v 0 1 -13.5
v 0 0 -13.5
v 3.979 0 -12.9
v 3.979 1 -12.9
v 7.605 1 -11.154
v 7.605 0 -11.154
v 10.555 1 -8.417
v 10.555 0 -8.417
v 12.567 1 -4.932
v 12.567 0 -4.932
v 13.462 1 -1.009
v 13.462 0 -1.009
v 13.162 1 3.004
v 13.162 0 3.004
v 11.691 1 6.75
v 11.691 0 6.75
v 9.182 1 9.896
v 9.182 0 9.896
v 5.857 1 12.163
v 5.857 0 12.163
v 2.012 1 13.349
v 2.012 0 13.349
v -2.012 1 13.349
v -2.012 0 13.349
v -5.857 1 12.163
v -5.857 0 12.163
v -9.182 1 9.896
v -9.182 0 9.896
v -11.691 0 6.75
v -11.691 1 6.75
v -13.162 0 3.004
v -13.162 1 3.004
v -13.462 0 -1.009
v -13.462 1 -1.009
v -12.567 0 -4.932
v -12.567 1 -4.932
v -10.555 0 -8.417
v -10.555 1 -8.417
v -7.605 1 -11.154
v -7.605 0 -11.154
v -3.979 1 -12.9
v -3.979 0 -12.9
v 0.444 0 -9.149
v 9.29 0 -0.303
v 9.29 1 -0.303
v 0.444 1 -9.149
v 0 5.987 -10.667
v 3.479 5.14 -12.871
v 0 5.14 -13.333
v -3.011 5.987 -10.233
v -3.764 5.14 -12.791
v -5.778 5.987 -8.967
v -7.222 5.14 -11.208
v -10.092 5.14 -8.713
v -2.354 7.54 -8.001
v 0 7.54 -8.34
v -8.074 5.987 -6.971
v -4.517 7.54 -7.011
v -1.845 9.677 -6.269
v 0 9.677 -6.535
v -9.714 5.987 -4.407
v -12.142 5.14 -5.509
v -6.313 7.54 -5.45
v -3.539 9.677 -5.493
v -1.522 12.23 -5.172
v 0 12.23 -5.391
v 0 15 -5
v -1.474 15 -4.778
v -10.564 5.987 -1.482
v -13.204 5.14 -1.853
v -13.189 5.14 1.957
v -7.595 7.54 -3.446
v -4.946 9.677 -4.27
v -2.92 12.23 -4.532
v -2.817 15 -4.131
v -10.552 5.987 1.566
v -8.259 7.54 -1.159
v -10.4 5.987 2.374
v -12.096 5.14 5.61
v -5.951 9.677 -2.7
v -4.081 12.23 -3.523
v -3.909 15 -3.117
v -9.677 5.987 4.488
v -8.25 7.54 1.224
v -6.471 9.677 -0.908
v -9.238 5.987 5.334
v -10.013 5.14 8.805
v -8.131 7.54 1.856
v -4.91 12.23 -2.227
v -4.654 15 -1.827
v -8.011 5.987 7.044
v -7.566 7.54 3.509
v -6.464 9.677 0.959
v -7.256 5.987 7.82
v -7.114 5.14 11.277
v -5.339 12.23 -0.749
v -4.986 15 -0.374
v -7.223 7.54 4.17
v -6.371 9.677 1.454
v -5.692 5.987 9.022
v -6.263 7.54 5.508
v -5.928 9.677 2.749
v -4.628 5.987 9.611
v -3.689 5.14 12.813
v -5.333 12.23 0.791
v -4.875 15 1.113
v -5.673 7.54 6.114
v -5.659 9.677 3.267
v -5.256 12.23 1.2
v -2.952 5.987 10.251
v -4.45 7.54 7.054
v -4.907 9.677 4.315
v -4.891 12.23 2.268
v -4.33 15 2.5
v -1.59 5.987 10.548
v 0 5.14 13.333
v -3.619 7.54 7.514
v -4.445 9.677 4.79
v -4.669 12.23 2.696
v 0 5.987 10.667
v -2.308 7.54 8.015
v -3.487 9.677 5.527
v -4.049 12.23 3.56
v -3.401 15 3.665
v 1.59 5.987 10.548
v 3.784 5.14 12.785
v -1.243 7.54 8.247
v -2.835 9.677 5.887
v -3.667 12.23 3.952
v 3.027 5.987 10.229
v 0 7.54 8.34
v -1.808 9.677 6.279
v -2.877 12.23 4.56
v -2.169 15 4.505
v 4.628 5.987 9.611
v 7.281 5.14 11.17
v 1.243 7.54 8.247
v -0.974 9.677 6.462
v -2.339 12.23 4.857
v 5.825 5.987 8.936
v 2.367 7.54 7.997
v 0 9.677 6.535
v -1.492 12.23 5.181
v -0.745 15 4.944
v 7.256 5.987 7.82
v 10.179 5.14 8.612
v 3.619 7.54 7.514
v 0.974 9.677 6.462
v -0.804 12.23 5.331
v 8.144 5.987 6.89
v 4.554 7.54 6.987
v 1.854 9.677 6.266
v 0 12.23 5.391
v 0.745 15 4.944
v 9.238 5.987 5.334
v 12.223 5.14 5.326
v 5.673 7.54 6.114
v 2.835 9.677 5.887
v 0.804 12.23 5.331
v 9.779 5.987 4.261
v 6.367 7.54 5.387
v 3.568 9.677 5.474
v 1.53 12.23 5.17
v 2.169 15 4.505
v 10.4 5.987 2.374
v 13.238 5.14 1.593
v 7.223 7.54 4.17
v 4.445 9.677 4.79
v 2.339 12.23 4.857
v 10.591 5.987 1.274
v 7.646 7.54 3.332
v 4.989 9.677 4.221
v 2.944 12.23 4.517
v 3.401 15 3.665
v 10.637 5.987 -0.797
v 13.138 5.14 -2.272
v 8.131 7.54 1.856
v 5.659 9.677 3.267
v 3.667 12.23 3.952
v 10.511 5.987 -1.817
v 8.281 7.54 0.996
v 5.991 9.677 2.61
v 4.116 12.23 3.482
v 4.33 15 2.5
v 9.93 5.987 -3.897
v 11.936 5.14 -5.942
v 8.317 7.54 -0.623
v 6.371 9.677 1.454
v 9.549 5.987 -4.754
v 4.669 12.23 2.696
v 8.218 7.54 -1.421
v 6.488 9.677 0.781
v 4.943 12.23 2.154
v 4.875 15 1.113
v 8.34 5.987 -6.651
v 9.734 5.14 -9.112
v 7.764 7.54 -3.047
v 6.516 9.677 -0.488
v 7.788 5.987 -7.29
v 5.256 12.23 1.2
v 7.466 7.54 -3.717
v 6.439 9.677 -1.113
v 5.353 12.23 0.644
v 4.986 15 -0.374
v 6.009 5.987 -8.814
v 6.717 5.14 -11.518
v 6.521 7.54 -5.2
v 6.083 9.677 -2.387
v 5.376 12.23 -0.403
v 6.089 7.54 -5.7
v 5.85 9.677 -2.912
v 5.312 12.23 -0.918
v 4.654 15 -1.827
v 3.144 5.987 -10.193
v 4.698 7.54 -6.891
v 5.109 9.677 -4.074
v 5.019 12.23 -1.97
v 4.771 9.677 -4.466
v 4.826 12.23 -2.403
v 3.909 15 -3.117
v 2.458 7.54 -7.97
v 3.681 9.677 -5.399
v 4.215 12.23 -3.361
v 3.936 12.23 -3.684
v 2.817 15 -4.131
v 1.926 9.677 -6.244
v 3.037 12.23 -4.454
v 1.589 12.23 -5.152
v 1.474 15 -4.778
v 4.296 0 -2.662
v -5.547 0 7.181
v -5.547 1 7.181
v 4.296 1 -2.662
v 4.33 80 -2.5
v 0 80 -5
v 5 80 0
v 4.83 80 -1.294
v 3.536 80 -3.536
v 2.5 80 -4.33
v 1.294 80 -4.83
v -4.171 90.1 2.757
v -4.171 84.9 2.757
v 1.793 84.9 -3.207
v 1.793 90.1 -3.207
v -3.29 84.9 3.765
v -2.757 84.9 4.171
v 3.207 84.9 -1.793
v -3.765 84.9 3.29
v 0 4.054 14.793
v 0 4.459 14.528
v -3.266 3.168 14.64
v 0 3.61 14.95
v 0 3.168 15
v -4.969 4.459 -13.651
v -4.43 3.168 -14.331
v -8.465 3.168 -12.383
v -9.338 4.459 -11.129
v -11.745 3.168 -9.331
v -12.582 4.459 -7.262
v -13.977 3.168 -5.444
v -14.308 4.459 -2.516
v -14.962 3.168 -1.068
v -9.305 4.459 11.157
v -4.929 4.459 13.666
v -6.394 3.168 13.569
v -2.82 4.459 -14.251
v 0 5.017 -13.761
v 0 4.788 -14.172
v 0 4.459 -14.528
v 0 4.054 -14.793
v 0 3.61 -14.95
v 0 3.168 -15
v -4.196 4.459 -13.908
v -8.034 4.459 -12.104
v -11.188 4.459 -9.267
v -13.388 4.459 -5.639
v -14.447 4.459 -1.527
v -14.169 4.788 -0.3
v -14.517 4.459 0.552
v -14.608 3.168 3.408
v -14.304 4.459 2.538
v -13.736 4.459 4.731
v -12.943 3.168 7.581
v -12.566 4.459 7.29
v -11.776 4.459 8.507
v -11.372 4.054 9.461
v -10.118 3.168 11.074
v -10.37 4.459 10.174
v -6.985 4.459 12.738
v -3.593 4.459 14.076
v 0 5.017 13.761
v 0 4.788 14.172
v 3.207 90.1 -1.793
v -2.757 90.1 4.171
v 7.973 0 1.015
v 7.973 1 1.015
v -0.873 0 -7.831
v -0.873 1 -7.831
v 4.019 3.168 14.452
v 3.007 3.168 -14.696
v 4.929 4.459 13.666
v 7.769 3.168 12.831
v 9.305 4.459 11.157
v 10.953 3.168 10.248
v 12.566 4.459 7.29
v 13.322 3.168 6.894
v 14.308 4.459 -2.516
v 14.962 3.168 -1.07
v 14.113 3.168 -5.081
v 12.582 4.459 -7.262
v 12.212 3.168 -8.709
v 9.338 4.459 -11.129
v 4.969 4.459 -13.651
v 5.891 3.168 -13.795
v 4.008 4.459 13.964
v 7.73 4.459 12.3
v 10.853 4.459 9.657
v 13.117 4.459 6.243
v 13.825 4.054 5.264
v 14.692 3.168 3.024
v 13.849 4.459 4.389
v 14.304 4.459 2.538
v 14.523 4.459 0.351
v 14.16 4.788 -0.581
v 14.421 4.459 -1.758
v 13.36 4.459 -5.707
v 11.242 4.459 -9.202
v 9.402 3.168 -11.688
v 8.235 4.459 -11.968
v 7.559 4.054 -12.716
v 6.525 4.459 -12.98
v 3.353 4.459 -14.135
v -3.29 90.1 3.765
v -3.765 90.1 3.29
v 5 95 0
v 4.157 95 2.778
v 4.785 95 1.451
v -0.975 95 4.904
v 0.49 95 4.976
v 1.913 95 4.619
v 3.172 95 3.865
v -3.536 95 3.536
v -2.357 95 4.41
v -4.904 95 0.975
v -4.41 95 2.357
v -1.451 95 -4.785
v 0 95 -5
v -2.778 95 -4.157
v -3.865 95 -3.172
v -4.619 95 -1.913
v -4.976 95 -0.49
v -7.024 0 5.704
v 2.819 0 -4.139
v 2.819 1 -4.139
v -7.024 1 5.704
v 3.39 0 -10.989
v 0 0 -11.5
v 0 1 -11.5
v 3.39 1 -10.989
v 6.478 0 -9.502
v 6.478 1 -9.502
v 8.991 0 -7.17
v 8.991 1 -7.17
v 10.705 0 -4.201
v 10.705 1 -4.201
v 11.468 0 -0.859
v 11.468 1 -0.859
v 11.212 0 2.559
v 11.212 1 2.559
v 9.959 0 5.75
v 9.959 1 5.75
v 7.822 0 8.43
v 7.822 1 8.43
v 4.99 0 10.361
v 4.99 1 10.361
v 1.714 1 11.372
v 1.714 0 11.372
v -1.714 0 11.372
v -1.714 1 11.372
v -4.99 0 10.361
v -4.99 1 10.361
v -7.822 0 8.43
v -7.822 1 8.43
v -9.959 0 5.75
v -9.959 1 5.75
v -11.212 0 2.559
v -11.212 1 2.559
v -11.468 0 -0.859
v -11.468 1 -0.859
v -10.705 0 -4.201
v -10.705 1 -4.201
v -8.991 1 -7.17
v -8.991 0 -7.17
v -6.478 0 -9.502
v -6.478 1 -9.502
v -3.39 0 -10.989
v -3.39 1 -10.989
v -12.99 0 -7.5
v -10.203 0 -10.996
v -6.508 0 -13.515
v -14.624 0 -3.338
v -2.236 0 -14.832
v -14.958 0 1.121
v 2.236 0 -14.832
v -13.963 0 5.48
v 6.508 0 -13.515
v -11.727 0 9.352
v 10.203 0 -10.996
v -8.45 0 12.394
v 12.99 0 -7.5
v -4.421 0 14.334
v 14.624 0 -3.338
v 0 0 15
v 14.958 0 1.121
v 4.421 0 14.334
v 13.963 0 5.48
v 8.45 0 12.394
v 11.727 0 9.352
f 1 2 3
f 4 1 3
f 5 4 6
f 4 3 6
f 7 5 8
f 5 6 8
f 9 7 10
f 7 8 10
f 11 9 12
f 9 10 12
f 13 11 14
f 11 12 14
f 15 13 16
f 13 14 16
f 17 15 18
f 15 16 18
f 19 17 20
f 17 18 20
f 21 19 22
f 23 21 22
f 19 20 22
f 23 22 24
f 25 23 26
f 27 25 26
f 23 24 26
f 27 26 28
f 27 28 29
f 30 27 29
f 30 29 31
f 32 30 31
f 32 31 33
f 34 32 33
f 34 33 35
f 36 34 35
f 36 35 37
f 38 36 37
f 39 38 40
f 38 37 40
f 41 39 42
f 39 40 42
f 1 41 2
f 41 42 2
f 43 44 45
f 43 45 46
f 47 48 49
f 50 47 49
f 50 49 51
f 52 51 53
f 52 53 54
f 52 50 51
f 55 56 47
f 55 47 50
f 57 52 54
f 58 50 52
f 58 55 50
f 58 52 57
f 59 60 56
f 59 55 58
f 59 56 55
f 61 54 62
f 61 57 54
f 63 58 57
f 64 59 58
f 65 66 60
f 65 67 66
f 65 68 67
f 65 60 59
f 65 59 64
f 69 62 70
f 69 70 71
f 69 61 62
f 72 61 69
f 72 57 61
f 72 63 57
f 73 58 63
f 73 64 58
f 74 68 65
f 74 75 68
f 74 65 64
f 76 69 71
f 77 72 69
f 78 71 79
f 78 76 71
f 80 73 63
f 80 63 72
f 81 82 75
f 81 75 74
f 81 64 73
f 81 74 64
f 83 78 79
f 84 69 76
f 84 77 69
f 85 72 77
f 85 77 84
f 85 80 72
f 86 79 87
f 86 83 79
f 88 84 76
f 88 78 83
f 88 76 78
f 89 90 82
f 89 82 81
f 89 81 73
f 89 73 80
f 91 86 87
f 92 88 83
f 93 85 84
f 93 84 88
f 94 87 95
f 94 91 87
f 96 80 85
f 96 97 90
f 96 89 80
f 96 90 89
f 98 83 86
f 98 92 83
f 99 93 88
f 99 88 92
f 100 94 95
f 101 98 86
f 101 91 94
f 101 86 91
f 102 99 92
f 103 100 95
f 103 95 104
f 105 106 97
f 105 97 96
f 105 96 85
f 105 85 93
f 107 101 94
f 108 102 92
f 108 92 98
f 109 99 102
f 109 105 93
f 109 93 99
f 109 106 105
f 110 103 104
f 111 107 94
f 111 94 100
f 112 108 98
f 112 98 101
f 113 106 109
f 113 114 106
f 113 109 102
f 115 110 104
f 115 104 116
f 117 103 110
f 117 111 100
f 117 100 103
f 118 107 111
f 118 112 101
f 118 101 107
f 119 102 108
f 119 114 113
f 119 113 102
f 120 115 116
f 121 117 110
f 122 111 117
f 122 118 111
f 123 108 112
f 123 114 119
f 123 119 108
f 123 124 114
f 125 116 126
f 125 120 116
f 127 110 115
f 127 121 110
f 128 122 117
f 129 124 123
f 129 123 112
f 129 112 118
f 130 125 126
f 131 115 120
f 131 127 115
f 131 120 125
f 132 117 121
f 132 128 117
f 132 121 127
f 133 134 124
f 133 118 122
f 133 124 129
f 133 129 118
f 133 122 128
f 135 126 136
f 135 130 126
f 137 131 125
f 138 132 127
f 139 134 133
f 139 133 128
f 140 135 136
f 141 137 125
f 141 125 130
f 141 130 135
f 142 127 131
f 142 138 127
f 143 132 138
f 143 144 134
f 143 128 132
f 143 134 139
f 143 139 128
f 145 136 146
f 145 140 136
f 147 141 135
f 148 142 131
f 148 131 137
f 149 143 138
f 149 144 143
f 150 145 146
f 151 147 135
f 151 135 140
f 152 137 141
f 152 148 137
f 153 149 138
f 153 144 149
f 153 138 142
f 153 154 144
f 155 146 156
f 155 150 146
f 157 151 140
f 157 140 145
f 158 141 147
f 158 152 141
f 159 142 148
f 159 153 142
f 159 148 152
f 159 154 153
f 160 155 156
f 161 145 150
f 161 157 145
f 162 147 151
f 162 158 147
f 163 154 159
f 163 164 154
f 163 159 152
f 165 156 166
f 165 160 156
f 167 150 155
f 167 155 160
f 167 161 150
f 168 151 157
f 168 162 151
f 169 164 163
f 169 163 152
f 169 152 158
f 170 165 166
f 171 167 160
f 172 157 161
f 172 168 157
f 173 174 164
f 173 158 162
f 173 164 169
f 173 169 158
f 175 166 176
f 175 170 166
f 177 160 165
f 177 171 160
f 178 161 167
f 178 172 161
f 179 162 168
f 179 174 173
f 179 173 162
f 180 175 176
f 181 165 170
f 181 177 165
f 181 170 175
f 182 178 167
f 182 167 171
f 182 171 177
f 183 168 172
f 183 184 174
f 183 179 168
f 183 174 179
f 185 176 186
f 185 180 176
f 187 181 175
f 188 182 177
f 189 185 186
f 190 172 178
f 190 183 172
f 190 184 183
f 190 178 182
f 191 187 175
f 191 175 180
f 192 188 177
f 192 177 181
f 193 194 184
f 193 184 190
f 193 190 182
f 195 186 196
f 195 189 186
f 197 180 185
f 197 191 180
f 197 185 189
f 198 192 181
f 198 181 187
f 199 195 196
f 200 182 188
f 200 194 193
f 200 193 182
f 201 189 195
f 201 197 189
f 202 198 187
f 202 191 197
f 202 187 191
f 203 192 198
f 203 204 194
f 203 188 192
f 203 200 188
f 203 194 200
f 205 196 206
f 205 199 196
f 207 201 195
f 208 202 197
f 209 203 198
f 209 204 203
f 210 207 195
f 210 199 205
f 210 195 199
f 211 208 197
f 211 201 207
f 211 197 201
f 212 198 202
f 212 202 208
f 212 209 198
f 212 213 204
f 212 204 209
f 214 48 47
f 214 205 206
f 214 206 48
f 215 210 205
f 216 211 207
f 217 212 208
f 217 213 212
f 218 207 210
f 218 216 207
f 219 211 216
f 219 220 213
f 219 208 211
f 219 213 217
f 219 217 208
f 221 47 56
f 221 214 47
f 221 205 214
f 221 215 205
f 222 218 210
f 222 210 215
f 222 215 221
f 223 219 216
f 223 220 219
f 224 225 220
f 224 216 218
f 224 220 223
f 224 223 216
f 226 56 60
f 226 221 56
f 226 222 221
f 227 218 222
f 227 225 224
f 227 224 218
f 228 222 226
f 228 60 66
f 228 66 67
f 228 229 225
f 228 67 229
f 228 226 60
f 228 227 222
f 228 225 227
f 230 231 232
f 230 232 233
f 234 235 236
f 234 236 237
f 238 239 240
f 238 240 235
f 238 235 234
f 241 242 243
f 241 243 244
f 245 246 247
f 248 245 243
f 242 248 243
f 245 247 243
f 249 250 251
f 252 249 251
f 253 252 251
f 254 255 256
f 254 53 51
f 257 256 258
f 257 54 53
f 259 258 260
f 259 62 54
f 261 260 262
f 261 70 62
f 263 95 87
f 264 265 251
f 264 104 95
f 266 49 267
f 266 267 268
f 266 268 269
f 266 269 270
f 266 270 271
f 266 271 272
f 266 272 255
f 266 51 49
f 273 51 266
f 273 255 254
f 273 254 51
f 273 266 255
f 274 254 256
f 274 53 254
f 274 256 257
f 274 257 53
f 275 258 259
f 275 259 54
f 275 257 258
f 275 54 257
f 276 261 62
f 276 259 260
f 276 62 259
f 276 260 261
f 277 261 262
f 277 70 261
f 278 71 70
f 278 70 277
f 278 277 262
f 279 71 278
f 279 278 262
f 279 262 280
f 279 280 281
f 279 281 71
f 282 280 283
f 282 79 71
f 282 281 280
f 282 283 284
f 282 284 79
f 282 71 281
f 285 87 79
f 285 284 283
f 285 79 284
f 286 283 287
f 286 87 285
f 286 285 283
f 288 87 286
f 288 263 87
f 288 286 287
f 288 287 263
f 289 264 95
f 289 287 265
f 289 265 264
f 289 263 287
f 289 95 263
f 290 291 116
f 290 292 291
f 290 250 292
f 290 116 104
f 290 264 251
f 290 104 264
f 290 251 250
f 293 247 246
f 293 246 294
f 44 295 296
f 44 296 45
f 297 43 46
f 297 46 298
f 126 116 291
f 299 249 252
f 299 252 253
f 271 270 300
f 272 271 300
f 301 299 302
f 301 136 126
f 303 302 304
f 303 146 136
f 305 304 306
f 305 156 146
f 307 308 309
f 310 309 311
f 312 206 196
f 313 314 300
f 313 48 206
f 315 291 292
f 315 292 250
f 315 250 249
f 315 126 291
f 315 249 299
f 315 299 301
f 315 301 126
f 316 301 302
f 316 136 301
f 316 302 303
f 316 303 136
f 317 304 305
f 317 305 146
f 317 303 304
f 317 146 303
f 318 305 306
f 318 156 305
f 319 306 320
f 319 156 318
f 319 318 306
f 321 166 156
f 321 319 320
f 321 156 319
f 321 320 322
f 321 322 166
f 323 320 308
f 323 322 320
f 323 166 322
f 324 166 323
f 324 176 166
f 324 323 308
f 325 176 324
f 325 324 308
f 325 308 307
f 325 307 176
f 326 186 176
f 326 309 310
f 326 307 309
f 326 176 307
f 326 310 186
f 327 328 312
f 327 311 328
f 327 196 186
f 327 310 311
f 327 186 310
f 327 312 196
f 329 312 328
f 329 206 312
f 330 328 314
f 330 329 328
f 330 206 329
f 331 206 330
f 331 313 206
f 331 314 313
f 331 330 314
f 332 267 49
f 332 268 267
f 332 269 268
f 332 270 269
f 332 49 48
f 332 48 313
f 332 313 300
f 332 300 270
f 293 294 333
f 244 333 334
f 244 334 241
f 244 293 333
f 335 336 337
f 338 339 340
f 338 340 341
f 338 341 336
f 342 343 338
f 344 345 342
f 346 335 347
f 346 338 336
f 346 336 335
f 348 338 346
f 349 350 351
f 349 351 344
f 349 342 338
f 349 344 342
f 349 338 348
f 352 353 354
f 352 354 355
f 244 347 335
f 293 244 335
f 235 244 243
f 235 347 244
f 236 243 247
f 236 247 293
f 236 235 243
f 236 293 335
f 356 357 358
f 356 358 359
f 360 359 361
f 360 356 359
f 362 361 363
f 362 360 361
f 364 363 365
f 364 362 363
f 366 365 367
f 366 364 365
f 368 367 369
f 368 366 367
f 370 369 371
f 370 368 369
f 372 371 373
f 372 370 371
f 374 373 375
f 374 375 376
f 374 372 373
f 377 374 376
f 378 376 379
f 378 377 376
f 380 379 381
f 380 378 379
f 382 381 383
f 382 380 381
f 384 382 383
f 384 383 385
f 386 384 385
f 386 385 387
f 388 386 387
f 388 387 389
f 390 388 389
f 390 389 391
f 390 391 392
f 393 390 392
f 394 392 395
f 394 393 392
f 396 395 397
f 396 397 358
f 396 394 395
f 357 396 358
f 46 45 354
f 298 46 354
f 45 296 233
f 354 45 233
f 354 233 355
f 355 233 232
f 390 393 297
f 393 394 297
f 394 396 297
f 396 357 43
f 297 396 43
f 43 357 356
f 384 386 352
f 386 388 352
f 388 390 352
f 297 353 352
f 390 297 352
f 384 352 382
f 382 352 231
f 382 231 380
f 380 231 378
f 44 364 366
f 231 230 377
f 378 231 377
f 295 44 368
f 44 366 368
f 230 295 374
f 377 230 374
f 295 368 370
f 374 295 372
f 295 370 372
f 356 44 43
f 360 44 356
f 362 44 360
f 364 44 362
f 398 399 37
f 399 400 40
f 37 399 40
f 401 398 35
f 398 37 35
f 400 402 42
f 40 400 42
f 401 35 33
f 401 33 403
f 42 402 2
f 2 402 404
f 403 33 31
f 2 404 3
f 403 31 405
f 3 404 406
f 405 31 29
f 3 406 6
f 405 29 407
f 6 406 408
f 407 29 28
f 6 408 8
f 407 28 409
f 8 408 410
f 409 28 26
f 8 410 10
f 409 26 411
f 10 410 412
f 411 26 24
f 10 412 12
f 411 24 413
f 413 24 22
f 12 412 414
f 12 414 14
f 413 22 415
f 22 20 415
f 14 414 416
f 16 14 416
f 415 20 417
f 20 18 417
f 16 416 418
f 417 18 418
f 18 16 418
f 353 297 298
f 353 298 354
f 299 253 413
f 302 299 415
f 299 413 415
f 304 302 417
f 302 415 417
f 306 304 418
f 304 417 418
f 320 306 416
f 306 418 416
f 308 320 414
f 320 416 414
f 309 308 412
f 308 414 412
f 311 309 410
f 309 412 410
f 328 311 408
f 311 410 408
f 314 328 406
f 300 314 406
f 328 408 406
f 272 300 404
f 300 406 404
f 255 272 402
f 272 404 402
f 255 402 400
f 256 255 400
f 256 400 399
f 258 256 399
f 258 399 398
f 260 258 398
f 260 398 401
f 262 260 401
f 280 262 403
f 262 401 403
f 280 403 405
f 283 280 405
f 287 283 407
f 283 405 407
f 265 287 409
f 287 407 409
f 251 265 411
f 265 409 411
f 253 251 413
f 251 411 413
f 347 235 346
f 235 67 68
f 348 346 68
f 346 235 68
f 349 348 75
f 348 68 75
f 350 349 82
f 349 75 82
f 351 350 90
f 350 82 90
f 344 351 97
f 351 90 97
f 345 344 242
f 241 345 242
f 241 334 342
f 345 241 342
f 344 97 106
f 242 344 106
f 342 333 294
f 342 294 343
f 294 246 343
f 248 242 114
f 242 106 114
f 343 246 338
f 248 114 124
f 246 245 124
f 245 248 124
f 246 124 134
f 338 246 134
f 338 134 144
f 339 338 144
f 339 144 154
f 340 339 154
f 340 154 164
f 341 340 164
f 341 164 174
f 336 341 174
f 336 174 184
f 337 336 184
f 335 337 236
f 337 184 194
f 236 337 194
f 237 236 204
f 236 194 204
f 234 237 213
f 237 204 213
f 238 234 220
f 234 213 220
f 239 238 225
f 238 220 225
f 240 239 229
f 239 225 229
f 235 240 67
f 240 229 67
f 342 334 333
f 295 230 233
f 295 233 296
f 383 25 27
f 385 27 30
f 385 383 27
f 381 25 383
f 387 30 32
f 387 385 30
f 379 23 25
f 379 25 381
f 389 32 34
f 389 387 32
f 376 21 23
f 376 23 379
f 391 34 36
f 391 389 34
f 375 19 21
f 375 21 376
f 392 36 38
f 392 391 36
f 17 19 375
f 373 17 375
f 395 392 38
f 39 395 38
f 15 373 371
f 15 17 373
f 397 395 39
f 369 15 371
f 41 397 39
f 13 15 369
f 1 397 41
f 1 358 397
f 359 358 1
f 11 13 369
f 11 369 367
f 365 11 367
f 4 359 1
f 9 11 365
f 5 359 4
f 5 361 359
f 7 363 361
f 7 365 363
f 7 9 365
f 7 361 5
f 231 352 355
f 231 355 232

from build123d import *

# Parameters (mm, degrees)
SKETCH1_R           = 15
BOSS_EXTRUDE1_DEPTH = 5
SKETCH2_R           = 5
BOSS_EXTRUDE2_DEPTH = 90
CUT_EXTRUDE1_START  = -15
CUT_EXTRUDE1_DEPTH  = 15
SKETCH4_W           = 2
SKETCH4_H           = 5.2
CUT_EXTRUDE2_DEPTH  = 99.17076958
FILLET1_R           = 10
FILLET2_R           = 2
CUT_EXTRUDE3_DEPTH  = 1
SKETCH6_R           = 13.5
SKETCH6_R_2         = 11.5
CUT_EXTRUDE4_DEPTH  = 1


with BuildPart() as part:
    # Sketch1 → Boss-Extrude1 (new body)
    with BuildSketch(Plane(origin=(0, 0, 0), x_dir=(1, 0, 0), z_dir=(0, 1, 0))):
        with Locations(Location((0, 0, 0), (0, 0, 270))):
            Circle(SKETCH1_R)
    extrude(amount=BOSS_EXTRUDE1_DEPTH)

    # Sketch2 → Boss-Extrude2 (add)
    with BuildSketch(Plane(origin=(0, 5, 0), x_dir=(1, 0, 0), z_dir=(0, 1, 0))):
        with Locations(Location((0, 0, 0), (0, 0, 90))):
            Circle(SKETCH2_R)
    extrude(amount=BOSS_EXTRUDE2_DEPTH)

    # Sketch3 → Cut-Extrude1 (cut)
    with BuildSketch(Plane(origin=(0, 95, 0), x_dir=(1, 0, 0), z_dir=(0, 1, 0)).offset(CUT_EXTRUDE1_START)):
        with BuildLine():
            Line((0, 5), (5, 0))
            ThreePointArc((5, 0), (3.535533906, 3.535533906), (0, 5))
        make_face()
    extrude(amount=CUT_EXTRUDE1_DEPTH, mode=Mode.SUBTRACT)

    # Sketch4 → Cut-Extrude2 (cut, through all)
    with BuildSketch(Plane(origin=(2.5, 0, -2.5), x_dir=(-0.7071067811865475, 0, -0.7071067811865477), z_dir=(0.7071067811865477, 0, -0.7071067811865475))):
        with Locations((0, 87.5)):
            Rectangle(SKETCH4_W, SKETCH4_H)
    extrude(amount=-CUT_EXTRUDE2_DEPTH, mode=Mode.SUBTRACT)

    # Fillet1
    fillet1_edges = [part.edges().sort_by_distance(p)[0] for p in [
        (0, 5, 5),
    ]]
    fillet(fillet1_edges, radius=FILLET1_R - 0.0001)  # a hair under: the kernel refuses the full size

    # Fillet2
    fillet2_edges = [part.edges().sort_by_distance(p)[0] for p in [
        (0, 5, -15),
    ]]
    fillet(fillet2_edges, radius=FILLET2_R)

    # Sketch5 → Cut-Extrude3 (cut)
    with BuildSketch(Plane.XZ):
        Polygon((-5.546534945, 7.181387117), (4.296413773, -2.661561601), (7.972695825, 1.01472045), (9.290003517, -0.302587242), (0.443849671, -9.148741088), (-0.873458021, -7.831433396), (2.818849671, -4.139125704), (-7.024099047, 5.703823014), align=None)
    extrude(amount=-CUT_EXTRUDE3_DEPTH, mode=Mode.SUBTRACT)

    # Sketch6 → Cut-Extrude4 (cut)
    with BuildSketch(Plane.XZ):
        with Locations(Location((0, 0, 0), (0, 0, 270))):
            Circle(SKETCH6_R)
        with Locations(Location((0, 0, 0), (0, 0, 270))):
            Circle(SKETCH6_R_2, mode=Mode.SUBTRACT)
    extrude(amount=-CUT_EXTRUDE4_DEPTH, mode=Mode.SUBTRACT)


solid = part.part
